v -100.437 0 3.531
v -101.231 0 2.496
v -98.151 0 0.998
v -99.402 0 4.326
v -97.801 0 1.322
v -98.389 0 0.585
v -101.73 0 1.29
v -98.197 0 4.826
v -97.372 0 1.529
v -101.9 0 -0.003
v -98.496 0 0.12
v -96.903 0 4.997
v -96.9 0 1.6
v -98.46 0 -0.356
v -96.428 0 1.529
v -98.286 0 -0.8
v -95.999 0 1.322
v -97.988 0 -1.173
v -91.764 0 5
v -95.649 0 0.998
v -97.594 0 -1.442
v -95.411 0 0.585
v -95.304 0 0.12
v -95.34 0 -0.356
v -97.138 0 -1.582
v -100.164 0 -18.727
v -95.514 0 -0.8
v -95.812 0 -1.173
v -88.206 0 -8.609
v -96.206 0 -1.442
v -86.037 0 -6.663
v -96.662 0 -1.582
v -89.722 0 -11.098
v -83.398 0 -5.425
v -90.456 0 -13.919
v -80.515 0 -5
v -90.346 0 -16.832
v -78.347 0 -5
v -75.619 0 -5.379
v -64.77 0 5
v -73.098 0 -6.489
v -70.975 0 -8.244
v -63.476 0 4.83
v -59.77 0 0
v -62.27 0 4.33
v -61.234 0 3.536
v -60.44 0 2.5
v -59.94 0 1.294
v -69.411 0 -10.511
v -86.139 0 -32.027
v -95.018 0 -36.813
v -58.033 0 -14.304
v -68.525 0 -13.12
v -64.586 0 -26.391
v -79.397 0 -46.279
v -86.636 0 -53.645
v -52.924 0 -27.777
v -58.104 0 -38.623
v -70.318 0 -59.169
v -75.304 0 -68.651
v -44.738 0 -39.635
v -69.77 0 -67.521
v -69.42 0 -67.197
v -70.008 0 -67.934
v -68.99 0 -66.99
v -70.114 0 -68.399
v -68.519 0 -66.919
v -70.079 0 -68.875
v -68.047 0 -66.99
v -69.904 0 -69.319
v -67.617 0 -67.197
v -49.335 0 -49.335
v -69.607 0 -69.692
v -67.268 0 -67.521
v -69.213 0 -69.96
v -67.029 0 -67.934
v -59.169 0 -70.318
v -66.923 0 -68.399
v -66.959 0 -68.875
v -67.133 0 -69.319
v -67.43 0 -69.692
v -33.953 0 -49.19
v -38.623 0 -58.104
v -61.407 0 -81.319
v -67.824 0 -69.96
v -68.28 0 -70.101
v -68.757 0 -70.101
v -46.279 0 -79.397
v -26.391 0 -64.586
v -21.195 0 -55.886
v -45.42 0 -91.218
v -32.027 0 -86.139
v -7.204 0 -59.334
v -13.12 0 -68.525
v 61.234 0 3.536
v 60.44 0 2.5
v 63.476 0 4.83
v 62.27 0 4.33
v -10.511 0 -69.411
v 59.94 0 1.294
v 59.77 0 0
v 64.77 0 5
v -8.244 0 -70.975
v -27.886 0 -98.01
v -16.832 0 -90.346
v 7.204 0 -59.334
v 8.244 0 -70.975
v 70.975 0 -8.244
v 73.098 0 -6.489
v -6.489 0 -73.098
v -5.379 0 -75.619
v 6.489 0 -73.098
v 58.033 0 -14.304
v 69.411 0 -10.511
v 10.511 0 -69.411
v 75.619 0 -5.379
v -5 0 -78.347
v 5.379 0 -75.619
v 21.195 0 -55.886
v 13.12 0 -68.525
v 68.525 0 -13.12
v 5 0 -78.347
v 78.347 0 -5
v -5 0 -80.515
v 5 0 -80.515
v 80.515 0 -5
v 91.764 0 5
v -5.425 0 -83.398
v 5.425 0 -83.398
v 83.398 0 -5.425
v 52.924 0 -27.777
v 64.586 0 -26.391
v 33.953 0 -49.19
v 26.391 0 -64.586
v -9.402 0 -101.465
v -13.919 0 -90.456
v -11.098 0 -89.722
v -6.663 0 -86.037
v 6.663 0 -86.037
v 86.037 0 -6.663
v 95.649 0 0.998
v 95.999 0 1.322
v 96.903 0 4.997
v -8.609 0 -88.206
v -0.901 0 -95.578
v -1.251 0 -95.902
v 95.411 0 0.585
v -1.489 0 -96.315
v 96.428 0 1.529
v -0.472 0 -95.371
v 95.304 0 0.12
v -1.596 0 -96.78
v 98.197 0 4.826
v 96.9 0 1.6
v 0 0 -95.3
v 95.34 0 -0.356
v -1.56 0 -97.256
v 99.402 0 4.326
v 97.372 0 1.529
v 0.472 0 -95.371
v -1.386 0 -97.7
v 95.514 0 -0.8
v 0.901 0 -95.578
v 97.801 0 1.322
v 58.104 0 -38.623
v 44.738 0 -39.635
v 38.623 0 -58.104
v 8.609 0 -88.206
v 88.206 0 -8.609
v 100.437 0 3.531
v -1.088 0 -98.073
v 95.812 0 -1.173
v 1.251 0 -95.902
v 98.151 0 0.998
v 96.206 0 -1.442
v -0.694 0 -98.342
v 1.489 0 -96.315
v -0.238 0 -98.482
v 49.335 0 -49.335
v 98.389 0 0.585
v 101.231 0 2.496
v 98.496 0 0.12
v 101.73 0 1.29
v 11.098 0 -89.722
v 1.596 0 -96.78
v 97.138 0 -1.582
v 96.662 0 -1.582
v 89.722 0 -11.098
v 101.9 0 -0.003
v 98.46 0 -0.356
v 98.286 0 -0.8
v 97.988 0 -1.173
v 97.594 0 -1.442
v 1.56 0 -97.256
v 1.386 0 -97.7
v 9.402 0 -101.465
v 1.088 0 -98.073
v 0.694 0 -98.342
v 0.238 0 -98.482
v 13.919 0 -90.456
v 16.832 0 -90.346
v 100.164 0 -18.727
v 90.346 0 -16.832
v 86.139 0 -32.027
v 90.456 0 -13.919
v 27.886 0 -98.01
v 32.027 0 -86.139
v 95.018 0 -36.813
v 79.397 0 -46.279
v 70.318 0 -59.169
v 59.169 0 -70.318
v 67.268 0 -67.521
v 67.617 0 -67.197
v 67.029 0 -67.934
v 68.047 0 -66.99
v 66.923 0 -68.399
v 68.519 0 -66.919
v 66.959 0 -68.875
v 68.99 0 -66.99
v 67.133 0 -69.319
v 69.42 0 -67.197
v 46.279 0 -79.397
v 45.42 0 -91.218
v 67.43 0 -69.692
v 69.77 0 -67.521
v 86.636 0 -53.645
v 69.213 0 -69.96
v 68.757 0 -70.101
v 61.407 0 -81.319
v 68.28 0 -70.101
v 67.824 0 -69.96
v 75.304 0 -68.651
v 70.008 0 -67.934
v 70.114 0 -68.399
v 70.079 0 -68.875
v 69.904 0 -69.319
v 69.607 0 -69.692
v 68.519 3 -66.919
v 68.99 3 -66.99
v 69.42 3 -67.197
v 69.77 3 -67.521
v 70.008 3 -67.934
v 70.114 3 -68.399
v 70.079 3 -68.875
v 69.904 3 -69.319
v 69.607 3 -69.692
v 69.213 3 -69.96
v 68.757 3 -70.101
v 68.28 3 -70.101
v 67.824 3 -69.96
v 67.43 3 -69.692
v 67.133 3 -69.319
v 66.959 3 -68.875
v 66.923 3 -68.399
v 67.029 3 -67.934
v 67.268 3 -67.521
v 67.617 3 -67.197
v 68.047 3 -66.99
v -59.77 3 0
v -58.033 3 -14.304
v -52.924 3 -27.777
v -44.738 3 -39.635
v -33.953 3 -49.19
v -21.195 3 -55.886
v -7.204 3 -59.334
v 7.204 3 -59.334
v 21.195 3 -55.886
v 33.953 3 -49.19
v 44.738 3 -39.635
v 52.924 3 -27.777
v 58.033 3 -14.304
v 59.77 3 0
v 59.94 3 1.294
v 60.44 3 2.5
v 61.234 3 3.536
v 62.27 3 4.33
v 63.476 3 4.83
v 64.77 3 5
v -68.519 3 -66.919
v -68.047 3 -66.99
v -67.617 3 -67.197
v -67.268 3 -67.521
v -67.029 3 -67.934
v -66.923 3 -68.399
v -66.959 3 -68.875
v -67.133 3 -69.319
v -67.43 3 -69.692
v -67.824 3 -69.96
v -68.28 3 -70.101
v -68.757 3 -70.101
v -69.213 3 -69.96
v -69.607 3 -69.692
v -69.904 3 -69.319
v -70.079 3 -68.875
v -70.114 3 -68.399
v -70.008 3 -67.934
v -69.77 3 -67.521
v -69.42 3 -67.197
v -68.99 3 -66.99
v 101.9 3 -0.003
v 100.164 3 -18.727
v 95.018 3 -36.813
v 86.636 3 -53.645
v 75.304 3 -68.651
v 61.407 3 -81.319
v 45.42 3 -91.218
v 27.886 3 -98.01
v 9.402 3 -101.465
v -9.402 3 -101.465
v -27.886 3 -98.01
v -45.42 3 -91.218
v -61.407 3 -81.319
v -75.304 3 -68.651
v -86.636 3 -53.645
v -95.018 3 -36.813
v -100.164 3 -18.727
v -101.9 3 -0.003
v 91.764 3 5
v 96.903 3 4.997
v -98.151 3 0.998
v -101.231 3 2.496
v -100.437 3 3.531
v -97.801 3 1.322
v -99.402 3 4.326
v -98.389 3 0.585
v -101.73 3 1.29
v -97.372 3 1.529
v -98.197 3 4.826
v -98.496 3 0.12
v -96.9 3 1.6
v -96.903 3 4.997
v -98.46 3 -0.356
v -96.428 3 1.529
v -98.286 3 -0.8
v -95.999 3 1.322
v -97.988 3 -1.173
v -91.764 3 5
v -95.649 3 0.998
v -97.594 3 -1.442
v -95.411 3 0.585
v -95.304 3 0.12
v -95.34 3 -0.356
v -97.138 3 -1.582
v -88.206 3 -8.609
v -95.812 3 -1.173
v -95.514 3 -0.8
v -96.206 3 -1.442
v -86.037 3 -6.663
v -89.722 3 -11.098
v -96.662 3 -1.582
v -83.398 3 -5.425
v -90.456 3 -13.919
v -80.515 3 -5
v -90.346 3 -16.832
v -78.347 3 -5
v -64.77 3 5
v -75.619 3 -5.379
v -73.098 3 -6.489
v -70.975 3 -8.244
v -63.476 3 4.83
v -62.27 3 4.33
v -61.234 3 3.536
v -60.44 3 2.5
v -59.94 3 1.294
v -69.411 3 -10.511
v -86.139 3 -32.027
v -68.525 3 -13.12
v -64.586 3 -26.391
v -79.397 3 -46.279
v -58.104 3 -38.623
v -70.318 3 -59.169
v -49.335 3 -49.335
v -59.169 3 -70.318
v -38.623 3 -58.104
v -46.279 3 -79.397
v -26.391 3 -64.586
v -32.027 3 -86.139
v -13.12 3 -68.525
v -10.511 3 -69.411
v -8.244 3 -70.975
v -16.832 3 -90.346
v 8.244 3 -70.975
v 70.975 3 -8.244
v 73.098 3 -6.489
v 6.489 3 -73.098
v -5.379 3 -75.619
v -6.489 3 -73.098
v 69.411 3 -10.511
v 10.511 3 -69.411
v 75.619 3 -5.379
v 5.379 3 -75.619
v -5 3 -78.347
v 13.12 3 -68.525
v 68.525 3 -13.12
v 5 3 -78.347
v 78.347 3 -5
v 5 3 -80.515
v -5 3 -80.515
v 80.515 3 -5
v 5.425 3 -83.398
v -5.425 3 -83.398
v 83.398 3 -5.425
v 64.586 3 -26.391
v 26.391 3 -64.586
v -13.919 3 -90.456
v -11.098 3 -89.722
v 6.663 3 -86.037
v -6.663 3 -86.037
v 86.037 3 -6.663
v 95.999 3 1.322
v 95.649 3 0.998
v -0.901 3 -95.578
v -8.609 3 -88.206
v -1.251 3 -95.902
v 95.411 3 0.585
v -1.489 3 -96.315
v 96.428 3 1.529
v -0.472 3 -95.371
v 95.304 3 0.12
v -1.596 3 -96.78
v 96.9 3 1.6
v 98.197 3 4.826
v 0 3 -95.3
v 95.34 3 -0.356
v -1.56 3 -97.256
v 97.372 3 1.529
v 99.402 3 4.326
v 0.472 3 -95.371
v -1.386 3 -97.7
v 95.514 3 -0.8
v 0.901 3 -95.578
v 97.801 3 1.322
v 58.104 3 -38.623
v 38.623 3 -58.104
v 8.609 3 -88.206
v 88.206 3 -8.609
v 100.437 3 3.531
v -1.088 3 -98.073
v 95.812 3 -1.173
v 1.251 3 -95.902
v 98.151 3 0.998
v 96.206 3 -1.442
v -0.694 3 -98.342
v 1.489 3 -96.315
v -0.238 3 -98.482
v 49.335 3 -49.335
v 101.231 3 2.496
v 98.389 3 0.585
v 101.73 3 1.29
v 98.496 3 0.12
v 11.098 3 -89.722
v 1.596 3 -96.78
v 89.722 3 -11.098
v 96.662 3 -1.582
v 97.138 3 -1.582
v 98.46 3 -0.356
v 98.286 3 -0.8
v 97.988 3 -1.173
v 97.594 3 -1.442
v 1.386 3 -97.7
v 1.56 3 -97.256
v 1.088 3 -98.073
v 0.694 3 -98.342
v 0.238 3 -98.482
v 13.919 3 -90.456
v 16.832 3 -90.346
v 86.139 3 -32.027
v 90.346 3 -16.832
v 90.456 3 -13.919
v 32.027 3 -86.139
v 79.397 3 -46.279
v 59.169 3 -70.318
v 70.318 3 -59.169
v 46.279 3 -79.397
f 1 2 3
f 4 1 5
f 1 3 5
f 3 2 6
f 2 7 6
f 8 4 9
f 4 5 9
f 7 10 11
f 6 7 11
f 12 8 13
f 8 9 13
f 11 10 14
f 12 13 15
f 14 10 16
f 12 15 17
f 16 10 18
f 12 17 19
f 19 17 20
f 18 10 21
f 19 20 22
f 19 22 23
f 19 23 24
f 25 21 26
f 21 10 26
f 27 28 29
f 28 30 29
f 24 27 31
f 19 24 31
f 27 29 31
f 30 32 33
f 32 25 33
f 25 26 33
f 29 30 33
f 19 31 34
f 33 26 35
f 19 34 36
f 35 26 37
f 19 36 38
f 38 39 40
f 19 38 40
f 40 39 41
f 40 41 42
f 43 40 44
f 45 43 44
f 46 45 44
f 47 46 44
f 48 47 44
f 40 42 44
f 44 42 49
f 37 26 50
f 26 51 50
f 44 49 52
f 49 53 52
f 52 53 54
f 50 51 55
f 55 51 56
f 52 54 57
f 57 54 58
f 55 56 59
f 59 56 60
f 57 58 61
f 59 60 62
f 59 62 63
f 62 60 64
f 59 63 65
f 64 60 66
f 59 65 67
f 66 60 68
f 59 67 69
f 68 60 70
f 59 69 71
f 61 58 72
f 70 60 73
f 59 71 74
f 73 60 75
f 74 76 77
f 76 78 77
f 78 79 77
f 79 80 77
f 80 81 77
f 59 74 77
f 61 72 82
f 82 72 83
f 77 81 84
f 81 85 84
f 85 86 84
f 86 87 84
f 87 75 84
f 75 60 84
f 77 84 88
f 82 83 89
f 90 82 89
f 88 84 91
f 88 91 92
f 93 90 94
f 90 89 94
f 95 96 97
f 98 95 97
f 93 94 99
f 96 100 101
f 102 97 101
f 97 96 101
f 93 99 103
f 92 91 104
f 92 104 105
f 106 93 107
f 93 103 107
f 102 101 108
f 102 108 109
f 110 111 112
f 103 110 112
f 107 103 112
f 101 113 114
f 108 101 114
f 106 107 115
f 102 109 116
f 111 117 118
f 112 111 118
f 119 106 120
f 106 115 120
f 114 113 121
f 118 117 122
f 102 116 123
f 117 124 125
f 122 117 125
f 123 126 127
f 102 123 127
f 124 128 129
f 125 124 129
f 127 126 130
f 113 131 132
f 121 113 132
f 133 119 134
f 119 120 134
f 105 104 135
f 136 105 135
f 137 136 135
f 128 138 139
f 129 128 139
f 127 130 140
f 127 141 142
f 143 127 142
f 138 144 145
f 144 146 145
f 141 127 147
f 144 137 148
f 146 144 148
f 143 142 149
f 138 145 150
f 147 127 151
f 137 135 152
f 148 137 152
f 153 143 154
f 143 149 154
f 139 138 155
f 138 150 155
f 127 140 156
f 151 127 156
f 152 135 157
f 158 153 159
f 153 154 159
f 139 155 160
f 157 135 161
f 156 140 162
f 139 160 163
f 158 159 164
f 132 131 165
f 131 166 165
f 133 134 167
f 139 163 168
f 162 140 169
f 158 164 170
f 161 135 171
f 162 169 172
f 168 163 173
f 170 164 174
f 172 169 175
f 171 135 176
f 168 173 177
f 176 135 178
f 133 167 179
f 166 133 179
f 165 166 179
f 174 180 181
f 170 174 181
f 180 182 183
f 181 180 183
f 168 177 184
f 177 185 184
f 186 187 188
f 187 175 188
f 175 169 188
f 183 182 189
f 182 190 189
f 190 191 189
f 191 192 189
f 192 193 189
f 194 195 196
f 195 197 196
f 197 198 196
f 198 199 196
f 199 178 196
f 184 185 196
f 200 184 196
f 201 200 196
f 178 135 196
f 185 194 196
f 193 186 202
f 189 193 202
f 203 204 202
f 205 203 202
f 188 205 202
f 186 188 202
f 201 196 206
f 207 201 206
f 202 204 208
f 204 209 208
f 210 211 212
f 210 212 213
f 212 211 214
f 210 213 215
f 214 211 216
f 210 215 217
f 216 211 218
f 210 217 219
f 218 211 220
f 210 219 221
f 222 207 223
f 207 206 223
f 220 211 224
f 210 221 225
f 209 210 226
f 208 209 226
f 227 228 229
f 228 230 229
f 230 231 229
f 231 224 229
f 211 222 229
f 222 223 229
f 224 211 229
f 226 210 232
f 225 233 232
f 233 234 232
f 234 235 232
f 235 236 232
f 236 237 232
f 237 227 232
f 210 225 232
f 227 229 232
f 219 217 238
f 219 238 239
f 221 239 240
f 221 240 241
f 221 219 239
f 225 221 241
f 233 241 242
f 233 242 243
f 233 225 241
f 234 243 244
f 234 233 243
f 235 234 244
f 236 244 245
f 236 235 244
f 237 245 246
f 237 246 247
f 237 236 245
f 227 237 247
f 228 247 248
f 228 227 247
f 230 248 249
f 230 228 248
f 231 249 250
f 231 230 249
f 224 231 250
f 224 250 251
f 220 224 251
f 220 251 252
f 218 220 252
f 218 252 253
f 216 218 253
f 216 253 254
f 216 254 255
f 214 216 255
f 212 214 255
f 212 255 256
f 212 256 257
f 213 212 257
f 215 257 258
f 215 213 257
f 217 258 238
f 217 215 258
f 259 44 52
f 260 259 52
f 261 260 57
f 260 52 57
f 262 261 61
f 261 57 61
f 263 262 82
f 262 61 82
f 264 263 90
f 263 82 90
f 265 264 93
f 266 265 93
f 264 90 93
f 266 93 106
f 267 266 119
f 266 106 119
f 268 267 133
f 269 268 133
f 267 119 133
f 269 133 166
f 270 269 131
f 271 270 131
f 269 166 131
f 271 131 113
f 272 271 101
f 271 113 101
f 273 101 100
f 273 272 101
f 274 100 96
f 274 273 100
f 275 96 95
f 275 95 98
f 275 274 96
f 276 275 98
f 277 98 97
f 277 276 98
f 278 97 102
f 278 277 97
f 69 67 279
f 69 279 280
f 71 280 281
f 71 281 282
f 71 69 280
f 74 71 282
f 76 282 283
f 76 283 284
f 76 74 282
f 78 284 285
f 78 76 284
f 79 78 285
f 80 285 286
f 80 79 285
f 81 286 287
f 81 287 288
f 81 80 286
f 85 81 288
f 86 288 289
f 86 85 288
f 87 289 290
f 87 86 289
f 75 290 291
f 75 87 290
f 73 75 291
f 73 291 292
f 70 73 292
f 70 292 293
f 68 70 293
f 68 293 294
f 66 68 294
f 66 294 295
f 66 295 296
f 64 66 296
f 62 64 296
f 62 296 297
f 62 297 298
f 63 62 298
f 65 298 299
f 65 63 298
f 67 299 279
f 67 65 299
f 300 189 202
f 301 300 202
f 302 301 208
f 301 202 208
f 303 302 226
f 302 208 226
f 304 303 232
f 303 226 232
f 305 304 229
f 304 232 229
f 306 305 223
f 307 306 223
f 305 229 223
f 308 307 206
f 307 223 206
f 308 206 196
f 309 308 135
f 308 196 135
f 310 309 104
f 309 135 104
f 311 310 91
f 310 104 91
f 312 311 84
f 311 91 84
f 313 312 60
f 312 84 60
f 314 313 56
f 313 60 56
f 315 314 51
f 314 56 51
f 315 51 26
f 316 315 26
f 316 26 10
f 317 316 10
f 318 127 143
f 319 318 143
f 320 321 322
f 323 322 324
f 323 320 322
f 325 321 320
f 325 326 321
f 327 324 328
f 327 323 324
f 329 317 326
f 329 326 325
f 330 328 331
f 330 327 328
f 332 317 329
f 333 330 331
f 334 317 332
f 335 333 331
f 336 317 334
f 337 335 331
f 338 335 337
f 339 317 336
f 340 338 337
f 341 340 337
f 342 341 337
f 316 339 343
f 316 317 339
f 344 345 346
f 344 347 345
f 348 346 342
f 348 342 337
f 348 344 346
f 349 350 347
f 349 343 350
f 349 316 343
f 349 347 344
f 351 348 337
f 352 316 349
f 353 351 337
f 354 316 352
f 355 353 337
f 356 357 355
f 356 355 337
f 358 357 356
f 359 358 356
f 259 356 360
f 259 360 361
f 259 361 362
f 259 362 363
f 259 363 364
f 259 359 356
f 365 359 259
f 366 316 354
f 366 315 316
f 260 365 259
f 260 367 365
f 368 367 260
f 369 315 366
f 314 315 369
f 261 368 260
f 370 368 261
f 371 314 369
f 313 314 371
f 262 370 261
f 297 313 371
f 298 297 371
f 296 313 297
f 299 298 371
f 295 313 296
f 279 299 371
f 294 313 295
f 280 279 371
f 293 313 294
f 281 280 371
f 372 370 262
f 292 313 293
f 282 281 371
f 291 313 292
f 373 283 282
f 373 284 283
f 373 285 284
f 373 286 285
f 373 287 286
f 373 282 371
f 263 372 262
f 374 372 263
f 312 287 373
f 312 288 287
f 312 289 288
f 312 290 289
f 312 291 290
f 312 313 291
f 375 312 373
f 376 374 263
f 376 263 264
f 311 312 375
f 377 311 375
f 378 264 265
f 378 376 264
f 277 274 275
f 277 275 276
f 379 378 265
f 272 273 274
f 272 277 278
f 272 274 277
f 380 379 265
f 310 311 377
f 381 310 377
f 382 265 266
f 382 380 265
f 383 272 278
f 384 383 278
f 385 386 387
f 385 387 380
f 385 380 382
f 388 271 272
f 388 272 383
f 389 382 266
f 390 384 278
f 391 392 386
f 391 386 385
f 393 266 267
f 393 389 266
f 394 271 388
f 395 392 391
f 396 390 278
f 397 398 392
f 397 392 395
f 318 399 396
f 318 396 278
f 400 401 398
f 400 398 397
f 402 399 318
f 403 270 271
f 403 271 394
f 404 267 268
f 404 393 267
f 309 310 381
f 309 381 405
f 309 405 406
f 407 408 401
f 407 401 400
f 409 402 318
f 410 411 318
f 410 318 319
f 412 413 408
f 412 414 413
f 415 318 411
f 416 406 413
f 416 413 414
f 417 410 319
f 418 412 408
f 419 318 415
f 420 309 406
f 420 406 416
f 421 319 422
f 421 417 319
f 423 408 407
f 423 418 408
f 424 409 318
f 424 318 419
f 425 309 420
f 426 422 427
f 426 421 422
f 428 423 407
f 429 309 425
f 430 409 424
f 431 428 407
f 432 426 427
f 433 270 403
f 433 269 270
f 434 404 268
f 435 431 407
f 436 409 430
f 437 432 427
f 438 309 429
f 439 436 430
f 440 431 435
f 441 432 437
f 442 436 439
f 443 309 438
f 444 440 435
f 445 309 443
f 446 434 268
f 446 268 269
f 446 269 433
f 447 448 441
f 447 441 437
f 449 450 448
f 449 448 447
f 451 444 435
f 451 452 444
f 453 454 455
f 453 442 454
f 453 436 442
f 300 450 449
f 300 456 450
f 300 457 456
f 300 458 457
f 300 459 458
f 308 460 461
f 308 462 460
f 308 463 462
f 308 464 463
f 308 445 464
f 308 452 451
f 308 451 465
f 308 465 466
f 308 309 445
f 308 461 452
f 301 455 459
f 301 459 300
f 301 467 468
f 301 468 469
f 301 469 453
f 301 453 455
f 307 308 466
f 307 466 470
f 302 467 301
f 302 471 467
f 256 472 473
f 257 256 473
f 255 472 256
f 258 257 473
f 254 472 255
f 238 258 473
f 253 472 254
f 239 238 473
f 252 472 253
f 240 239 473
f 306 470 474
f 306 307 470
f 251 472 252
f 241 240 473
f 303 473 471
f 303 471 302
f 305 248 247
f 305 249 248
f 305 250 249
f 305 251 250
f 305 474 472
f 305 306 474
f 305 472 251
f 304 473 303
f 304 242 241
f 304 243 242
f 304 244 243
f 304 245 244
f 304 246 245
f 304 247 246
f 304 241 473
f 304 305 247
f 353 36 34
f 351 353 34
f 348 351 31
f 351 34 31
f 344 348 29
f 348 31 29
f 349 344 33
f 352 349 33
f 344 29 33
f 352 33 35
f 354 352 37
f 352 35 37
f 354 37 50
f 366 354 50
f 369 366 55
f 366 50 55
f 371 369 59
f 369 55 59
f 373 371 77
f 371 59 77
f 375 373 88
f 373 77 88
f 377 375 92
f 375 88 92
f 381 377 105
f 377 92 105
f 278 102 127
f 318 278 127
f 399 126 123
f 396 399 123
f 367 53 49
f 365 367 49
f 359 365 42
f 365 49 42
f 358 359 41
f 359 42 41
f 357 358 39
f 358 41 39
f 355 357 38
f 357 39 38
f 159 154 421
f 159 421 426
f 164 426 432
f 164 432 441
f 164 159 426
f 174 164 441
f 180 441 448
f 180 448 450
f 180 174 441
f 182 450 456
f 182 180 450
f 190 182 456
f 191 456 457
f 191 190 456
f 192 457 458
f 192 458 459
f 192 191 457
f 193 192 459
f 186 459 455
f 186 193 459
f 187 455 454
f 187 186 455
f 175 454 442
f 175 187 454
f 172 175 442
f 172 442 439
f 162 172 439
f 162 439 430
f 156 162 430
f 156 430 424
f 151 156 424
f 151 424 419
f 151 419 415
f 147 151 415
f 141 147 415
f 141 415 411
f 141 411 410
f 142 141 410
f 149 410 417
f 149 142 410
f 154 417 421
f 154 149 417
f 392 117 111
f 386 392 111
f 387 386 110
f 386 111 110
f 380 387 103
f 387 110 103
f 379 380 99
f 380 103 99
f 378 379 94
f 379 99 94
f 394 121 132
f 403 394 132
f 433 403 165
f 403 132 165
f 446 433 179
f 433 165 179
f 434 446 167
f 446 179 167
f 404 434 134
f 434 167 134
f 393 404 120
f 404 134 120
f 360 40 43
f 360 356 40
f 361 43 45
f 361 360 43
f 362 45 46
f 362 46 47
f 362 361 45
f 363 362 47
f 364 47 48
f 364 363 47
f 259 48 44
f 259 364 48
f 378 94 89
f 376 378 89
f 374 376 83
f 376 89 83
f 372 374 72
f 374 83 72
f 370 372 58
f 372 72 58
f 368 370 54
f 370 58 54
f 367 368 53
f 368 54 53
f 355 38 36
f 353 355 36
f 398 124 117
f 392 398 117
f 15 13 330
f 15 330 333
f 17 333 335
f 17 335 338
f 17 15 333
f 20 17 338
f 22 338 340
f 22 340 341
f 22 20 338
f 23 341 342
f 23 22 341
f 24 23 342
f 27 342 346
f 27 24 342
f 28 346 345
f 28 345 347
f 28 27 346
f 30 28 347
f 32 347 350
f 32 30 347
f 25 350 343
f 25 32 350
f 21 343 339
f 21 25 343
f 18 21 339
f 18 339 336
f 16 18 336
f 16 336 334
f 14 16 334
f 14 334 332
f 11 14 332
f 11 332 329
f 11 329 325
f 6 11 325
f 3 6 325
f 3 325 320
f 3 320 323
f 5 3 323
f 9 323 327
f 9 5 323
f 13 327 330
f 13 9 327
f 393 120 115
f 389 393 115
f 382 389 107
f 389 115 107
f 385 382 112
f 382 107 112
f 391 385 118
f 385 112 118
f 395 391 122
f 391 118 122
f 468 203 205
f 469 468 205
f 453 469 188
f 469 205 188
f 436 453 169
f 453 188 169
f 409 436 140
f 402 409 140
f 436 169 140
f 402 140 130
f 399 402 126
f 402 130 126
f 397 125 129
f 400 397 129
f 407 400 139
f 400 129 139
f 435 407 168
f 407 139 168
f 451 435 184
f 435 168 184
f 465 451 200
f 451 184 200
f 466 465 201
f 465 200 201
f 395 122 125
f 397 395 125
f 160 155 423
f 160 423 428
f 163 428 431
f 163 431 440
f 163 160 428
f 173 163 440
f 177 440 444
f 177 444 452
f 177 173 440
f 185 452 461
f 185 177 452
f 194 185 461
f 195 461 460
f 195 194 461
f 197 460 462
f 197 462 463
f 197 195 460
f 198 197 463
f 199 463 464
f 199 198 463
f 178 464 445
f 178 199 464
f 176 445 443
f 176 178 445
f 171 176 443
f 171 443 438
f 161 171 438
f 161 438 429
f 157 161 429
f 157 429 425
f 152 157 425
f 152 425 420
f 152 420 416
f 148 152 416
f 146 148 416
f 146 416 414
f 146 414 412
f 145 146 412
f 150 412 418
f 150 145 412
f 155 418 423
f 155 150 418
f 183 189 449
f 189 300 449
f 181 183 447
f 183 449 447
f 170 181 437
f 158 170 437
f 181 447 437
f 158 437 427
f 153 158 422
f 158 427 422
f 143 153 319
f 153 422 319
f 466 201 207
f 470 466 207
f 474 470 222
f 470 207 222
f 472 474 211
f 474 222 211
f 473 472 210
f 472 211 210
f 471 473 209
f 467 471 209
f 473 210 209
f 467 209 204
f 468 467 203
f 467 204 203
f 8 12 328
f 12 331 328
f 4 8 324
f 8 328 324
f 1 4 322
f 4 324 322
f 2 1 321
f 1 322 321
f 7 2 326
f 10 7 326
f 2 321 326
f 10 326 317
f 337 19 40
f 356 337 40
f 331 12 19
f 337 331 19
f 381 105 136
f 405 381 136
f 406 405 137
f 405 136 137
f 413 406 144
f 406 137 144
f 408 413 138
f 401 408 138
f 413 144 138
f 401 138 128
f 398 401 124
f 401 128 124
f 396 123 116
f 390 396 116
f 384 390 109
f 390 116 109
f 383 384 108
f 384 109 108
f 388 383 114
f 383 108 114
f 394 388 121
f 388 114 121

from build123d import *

# Parameters (mm, degrees)
SKETCH_1_R      = 1.6
EXTRUDE_1_DEPTH = 3
FILLET_1_R      = 5
FILLET_2_R      = 5


with BuildPart() as part:
    # 草图1 → 凸台-拉伸1 (new body)
    with BuildSketch(Plane(origin=(0, 0, 0), x_dir=(1, 0, 0), z_dir=(0, 1, 0))):
        with BuildLine():
            Line((-91.763881784, -5), (-64.576721038, -5))
            Line((-64.576721038, -5), (-59.560497815, -5))
            ThreePointArc((-59.560497815, -5), (0, 59.77), (59.560497815, -5))
            Line((59.560497815, -5), (64.576721038, -5))
            Line((64.576721038, -5), (91.763881784, -5))
            Line((91.763881784, -5), (101.777551781, -4.993991746))
            ThreePointArc((101.777551781, -4.993991746), (0, 101.9), (-101.777551781, -4.993991746))
            Line((-101.777551781, -4.993991746), (-91.763881784, -5))
        make_face()
        with Locations(Location((-96.9, 0, 0), (0, 0, 270))):
            Circle(SKETCH_1_R, mode=Mode.SUBTRACT)
        with Locations(Location((96.9, 0, 0), (0, 0, 270))):
            Circle(SKETCH_1_R, mode=Mode.SUBTRACT)
        with BuildLine():
            Line((-78.347003133, 5), (-80.514657051, 5))
            ThreePointArc((-80.514657051, 5), (-88.206048938, 8.609186997), (-90.345506507, 16.831501832))
            ThreePointArc((-90.345506507, 16.831501832), (-64.983113191, 64.983113191), (-16.831501832, 90.345506507))
            ThreePointArc((-16.831501832, 90.345506507), (-8.609186997, 88.206048938), (-5, 80.514657051))
            Line((-5, 80.514657051), (-5, 78.347003133))
            ThreePointArc((-5, 78.347003133), (-7.292728703, 71.975349568), (-13.119593832, 68.525390606))
            ThreePointArc((-13.119593832, 68.525390606), (-49.334840123, 49.334840123), (-68.525390606, 13.119593832))
            ThreePointArc((-68.525390606, 13.119593832), (-71.975349568, 7.292728703), (-78.347003133, 5))
        make_face(mode=Mode.SUBTRACT)
        with Locations(Location((-68.518647097, 68.518647097, 0), (0, 0, 270))):
            Circle(SKETCH_1_R, mode=Mode.SUBTRACT)
        with BuildLine():
            ThreePointArc((5, 80.514657051), (8.609186997, 88.206048938), (16.831501831, 90.345506507))
            ThreePointArc((16.831501831, 90.345506507), (64.983113191, 64.983113191), (90.345506507, 16.831501832))
            ThreePointArc((90.345506507, 16.831501832), (88.206048938, 8.609186997), (80.514657051, 5))
            Line((80.514657051, 5), (78.347003133, 5))
            ThreePointArc((78.347003133, 5), (71.975349568, 7.292728703), (68.525390606, 13.119593832))
            ThreePointArc((68.525390606, 13.119593832), (49.334840123, 49.334840123), (13.119593832, 68.525390606))
            ThreePointArc((13.119593832, 68.525390606), (7.292728703, 71.975349568), (5, 78.347003133))
            Line((5, 78.347003133), (5, 80.514657051))
        make_face(mode=Mode.SUBTRACT)
        with Locations(Location((0, 96.9, 0), (0, 0, 270))):
            Circle(SKETCH_1_R, mode=Mode.SUBTRACT)
        with Locations(Location((68.518647097, 68.518647097, 0), (0, 0, 270))):
            Circle(SKETCH_1_R, mode=Mode.SUBTRACT)
    extrude(amount=EXTRUDE_1_DEPTH)

    # 圆角1
    fillet_1_edges = [part.edges().sort_by_distance(p)[0] for p in [
        (-101.777551781, 1.5, 4.993991746),
        (101.777551781, 1.5, 4.993991746),
    ]]
    fillet(fillet_1_edges, radius=FILLET_1_R)

    # 圆角2
    fillet_2_edges = [part.edges().sort_by_distance(p)[0] for p in [
        (-59.560497815, 1.5, 5),
        (59.560497815, 1.5, 5),
    ]]
    fillet(fillet_2_edges, radius=FILLET_2_R)


solid = part.part
